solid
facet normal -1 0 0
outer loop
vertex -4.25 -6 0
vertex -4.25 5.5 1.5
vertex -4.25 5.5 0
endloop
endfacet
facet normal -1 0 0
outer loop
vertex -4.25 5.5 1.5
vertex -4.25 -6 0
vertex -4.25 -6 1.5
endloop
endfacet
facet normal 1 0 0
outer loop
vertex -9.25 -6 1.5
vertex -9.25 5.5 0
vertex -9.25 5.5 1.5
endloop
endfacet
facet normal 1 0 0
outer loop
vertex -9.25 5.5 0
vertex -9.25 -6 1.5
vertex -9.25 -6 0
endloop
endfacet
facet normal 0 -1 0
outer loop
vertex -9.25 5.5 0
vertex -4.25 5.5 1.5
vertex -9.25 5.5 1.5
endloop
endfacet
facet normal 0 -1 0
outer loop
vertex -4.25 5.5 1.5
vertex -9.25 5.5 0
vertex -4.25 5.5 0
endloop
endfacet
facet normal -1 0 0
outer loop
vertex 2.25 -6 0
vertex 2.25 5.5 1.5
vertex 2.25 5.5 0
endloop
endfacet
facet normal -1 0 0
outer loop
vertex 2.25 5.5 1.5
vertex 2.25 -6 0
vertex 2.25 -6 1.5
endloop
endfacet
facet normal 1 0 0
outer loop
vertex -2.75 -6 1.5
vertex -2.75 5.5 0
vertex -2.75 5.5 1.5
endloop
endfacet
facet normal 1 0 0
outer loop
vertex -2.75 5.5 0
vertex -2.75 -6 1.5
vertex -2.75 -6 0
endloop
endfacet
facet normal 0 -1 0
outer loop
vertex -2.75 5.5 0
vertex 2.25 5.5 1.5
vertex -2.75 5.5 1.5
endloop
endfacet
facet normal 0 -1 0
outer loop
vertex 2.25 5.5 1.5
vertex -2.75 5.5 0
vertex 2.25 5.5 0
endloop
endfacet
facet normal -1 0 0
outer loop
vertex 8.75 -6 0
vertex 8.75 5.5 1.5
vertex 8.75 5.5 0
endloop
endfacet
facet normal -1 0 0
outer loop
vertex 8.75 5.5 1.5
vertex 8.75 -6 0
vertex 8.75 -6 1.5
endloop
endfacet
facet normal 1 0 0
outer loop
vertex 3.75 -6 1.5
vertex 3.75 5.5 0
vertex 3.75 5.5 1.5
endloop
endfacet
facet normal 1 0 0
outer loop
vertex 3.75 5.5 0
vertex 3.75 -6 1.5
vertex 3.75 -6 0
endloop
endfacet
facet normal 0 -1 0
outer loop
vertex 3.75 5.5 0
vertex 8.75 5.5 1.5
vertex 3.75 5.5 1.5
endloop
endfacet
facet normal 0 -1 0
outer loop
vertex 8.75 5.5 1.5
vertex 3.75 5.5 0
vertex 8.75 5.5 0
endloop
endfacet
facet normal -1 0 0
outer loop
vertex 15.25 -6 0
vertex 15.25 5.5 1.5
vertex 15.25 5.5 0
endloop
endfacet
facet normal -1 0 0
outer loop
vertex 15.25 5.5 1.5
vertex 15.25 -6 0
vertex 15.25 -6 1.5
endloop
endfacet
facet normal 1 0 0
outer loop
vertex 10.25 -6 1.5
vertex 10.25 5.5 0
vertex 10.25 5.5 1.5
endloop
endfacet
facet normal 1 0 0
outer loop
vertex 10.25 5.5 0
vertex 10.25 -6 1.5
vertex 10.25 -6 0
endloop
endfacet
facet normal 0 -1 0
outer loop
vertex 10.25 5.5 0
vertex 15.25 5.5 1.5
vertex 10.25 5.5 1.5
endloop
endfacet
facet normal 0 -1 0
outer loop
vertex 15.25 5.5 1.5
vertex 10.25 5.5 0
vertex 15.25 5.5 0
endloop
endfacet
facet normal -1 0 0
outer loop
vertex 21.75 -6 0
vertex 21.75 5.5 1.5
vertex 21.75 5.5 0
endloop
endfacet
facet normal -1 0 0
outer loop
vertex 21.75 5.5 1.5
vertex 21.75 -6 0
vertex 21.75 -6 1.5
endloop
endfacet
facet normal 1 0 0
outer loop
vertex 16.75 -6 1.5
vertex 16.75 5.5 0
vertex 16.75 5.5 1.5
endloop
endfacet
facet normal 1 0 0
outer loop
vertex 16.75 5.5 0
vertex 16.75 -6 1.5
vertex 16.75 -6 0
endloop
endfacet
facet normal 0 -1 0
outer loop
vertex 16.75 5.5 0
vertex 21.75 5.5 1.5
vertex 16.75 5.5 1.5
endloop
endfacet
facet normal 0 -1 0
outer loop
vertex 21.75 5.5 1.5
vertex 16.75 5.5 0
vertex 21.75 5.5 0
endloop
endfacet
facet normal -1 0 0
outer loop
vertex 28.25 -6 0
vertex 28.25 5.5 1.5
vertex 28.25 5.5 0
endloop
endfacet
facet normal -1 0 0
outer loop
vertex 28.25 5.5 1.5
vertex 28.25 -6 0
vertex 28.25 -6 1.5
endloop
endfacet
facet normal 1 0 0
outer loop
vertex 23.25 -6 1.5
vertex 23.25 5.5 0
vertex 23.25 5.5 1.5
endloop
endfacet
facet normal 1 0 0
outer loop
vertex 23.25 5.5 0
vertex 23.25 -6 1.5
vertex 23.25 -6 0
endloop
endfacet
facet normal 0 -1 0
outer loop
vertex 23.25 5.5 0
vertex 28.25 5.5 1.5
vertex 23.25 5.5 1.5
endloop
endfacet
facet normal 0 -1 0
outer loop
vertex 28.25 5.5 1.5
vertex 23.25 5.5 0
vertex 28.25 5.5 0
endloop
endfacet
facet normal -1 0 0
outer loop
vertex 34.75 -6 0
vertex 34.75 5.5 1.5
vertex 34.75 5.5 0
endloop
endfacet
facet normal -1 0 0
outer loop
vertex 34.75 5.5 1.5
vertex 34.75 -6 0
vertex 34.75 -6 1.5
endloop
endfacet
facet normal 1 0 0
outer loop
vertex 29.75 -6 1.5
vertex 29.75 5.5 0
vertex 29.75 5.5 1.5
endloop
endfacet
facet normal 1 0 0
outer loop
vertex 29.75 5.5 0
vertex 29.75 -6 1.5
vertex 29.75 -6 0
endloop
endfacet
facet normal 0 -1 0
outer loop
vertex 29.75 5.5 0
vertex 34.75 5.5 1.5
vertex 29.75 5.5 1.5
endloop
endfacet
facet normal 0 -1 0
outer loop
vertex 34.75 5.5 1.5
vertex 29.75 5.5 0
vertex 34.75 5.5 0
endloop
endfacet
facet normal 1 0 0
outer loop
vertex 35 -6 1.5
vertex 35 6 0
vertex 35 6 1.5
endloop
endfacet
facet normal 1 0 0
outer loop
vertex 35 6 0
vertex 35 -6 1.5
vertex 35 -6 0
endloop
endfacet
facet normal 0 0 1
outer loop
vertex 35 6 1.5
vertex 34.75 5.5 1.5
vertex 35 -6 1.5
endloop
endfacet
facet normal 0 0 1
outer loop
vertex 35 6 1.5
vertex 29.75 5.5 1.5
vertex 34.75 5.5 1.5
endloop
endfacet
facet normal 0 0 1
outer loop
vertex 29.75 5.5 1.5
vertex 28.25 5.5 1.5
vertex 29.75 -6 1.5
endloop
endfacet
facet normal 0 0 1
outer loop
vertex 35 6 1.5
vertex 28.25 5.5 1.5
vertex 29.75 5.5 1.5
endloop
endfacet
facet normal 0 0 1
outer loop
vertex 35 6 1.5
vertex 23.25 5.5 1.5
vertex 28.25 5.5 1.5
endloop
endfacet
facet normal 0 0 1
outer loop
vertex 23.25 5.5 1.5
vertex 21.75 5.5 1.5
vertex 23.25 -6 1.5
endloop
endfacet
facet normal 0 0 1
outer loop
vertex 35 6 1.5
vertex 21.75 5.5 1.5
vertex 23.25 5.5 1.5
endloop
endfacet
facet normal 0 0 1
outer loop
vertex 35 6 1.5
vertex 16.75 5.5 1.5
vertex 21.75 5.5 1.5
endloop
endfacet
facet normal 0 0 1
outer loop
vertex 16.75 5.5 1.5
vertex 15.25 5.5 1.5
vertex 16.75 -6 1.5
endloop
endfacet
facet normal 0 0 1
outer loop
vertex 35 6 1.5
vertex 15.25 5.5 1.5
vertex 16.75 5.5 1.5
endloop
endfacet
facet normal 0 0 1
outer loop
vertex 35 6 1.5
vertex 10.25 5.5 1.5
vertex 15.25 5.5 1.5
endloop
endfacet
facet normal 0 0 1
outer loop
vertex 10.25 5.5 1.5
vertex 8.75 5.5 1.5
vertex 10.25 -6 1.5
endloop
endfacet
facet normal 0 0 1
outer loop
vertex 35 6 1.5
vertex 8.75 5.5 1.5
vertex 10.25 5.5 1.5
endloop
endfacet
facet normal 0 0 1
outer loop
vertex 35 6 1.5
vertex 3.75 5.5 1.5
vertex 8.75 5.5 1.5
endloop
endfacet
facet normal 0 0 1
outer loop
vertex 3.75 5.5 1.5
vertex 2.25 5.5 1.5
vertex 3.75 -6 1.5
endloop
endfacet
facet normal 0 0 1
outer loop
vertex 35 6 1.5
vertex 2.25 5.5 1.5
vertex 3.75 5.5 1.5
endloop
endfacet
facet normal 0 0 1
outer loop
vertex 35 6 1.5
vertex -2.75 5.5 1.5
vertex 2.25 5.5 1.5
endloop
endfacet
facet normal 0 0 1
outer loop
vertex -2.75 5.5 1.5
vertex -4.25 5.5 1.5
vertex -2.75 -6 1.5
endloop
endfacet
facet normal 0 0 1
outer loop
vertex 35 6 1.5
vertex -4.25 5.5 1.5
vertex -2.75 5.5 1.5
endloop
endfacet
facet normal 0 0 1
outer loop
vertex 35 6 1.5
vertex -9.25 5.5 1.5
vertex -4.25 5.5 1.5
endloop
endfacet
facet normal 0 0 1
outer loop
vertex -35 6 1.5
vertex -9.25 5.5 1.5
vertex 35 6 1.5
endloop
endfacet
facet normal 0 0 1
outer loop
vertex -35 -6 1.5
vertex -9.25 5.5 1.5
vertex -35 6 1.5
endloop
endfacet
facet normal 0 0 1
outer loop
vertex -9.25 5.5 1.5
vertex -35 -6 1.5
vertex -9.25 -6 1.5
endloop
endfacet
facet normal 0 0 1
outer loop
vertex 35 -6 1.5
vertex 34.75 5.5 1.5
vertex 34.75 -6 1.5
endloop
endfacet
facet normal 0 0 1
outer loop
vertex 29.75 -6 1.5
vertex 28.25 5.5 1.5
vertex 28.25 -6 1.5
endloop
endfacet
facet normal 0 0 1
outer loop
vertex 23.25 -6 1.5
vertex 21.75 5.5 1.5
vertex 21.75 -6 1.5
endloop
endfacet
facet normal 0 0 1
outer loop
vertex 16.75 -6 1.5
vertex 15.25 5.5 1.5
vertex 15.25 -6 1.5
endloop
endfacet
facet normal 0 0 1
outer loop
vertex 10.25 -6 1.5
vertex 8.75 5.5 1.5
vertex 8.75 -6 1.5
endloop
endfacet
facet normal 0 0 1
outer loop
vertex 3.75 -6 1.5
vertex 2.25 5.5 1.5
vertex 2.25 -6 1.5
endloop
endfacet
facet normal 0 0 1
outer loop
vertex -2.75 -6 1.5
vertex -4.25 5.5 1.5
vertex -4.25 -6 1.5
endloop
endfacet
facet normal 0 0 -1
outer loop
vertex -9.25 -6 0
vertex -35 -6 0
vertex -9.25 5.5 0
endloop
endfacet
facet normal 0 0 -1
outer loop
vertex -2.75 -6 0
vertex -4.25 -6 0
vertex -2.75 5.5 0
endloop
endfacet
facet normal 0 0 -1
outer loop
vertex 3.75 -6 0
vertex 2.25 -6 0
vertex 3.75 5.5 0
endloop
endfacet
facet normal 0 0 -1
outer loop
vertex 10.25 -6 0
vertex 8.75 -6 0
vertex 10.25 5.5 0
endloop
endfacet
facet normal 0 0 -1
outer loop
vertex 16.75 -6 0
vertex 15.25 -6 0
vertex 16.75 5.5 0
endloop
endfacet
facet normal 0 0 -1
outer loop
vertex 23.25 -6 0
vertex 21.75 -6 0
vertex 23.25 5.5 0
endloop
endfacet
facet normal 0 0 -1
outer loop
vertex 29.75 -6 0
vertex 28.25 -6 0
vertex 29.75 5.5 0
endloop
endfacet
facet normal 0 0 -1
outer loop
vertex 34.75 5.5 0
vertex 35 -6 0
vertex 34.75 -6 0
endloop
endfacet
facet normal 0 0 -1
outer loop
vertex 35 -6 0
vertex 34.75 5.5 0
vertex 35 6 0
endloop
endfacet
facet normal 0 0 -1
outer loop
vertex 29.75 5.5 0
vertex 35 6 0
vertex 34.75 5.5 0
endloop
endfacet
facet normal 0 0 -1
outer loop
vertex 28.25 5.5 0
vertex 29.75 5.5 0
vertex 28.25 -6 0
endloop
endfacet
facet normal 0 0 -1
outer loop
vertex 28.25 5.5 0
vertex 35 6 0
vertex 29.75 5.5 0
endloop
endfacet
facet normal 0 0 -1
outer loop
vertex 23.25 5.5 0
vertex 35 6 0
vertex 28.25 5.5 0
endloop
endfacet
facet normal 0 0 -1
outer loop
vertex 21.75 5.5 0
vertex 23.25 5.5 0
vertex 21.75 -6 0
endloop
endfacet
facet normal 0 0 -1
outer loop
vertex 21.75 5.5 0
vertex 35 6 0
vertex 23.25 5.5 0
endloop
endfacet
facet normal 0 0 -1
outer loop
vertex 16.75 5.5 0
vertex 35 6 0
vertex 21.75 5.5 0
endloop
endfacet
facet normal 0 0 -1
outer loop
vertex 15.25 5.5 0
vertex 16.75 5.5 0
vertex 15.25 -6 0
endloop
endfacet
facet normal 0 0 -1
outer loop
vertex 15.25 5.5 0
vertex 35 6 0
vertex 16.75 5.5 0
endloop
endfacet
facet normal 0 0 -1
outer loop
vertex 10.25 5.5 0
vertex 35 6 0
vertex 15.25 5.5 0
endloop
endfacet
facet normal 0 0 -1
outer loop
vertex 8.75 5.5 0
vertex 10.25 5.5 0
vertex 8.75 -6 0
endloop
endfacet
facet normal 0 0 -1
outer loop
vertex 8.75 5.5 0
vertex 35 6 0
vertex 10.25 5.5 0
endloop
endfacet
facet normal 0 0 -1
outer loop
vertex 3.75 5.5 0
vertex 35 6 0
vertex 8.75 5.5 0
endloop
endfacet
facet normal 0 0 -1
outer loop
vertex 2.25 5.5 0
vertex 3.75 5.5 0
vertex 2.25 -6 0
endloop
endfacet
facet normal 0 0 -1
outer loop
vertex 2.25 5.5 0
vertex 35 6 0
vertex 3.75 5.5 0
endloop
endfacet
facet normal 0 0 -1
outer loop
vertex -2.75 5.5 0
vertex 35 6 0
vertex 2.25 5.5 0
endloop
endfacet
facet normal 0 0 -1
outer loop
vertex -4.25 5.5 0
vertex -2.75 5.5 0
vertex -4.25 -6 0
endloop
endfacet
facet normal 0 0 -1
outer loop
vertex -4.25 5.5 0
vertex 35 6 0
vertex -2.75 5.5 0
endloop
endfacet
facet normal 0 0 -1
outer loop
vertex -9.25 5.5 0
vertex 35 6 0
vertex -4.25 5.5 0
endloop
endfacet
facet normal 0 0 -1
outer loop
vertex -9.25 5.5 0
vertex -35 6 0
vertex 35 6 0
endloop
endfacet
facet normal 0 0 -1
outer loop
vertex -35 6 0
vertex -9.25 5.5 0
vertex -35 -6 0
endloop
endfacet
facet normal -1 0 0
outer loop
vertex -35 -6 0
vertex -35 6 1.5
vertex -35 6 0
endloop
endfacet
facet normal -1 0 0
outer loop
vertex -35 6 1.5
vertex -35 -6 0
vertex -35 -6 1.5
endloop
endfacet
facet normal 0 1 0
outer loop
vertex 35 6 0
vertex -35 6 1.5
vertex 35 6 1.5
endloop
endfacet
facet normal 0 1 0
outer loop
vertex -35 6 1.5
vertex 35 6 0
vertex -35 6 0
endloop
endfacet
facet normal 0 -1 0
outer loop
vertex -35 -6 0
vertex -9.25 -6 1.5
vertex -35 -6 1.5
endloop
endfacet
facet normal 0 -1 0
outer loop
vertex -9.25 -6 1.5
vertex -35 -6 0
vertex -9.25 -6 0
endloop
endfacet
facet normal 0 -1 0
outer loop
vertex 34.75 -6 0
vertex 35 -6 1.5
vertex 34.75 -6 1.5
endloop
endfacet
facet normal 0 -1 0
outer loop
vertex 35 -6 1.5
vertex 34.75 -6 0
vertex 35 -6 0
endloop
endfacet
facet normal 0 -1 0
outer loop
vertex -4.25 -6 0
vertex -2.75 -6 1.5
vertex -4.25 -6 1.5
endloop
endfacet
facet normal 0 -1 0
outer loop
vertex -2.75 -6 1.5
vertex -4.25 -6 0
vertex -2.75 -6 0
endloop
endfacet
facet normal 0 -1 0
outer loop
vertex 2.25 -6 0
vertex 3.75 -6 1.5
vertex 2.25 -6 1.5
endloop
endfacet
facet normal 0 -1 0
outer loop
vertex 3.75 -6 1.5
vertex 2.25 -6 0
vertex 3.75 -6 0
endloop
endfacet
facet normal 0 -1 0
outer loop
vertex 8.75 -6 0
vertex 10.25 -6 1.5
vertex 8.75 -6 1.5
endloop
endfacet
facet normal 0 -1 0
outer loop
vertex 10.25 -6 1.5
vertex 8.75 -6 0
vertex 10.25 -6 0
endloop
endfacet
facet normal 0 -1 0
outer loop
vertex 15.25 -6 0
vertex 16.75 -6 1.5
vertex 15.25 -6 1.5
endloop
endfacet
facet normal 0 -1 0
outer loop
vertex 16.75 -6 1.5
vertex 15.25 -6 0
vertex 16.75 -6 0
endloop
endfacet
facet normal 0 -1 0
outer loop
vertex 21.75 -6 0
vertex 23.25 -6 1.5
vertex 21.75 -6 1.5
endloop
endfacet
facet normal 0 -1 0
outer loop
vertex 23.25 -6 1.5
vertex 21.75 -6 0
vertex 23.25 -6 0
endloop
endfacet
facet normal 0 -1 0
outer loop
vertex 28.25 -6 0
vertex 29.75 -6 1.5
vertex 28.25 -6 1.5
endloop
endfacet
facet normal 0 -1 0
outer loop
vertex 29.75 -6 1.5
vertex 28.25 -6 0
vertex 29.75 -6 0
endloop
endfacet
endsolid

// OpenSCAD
// 10-well comb for casting agarose gels, printed lying flat
// Units: mm. Print orientation: flat on bed, teeth pointing -Y.

// ---------- Parameters ----------
spine_len      = 70;    // spine (back bar) length (X)
spine_wid      = 12;    // spine width (Y)
plate_thk      = 1.5;   // plate thickness (Z)

tooth_count    = 10;    // number of teeth
tooth_w        = 5.0;   // tooth width (X)
tooth_len      = 12;    // tooth length (Y)
tooth_gap      = 1.5;   // gap between neighbouring teeth (X)

eps            = 0.5;   // cutter overshoot past top/bottom faces

$fn = 64;

// ---------- Derived ----------
row_wid        = tooth_w + tooth_gap;   // width of tooth+gap
row_start_x    = -(tooth_count - 1) * tooth_gap / 2;  // first tooth X (centred row)

// ---------- Model ----------
difference() {
    // Base plate with spine
    translate([-spine_len / 2, -spine_wid / 2, 0])
        cube([spine_len, spine_wid, plate_thk]);

    // Teeth hanging in -Y direction
    for (i = [0 : tooth_count - 1])
        translate([row_start_x + i * row_wid - tooth_w / 2,
                   -tooth_len - eps,
                   -eps])
            cube([tooth_w, tooth_len + tooth_w + 2 * eps, plate_thk + 2 * eps]);
}
